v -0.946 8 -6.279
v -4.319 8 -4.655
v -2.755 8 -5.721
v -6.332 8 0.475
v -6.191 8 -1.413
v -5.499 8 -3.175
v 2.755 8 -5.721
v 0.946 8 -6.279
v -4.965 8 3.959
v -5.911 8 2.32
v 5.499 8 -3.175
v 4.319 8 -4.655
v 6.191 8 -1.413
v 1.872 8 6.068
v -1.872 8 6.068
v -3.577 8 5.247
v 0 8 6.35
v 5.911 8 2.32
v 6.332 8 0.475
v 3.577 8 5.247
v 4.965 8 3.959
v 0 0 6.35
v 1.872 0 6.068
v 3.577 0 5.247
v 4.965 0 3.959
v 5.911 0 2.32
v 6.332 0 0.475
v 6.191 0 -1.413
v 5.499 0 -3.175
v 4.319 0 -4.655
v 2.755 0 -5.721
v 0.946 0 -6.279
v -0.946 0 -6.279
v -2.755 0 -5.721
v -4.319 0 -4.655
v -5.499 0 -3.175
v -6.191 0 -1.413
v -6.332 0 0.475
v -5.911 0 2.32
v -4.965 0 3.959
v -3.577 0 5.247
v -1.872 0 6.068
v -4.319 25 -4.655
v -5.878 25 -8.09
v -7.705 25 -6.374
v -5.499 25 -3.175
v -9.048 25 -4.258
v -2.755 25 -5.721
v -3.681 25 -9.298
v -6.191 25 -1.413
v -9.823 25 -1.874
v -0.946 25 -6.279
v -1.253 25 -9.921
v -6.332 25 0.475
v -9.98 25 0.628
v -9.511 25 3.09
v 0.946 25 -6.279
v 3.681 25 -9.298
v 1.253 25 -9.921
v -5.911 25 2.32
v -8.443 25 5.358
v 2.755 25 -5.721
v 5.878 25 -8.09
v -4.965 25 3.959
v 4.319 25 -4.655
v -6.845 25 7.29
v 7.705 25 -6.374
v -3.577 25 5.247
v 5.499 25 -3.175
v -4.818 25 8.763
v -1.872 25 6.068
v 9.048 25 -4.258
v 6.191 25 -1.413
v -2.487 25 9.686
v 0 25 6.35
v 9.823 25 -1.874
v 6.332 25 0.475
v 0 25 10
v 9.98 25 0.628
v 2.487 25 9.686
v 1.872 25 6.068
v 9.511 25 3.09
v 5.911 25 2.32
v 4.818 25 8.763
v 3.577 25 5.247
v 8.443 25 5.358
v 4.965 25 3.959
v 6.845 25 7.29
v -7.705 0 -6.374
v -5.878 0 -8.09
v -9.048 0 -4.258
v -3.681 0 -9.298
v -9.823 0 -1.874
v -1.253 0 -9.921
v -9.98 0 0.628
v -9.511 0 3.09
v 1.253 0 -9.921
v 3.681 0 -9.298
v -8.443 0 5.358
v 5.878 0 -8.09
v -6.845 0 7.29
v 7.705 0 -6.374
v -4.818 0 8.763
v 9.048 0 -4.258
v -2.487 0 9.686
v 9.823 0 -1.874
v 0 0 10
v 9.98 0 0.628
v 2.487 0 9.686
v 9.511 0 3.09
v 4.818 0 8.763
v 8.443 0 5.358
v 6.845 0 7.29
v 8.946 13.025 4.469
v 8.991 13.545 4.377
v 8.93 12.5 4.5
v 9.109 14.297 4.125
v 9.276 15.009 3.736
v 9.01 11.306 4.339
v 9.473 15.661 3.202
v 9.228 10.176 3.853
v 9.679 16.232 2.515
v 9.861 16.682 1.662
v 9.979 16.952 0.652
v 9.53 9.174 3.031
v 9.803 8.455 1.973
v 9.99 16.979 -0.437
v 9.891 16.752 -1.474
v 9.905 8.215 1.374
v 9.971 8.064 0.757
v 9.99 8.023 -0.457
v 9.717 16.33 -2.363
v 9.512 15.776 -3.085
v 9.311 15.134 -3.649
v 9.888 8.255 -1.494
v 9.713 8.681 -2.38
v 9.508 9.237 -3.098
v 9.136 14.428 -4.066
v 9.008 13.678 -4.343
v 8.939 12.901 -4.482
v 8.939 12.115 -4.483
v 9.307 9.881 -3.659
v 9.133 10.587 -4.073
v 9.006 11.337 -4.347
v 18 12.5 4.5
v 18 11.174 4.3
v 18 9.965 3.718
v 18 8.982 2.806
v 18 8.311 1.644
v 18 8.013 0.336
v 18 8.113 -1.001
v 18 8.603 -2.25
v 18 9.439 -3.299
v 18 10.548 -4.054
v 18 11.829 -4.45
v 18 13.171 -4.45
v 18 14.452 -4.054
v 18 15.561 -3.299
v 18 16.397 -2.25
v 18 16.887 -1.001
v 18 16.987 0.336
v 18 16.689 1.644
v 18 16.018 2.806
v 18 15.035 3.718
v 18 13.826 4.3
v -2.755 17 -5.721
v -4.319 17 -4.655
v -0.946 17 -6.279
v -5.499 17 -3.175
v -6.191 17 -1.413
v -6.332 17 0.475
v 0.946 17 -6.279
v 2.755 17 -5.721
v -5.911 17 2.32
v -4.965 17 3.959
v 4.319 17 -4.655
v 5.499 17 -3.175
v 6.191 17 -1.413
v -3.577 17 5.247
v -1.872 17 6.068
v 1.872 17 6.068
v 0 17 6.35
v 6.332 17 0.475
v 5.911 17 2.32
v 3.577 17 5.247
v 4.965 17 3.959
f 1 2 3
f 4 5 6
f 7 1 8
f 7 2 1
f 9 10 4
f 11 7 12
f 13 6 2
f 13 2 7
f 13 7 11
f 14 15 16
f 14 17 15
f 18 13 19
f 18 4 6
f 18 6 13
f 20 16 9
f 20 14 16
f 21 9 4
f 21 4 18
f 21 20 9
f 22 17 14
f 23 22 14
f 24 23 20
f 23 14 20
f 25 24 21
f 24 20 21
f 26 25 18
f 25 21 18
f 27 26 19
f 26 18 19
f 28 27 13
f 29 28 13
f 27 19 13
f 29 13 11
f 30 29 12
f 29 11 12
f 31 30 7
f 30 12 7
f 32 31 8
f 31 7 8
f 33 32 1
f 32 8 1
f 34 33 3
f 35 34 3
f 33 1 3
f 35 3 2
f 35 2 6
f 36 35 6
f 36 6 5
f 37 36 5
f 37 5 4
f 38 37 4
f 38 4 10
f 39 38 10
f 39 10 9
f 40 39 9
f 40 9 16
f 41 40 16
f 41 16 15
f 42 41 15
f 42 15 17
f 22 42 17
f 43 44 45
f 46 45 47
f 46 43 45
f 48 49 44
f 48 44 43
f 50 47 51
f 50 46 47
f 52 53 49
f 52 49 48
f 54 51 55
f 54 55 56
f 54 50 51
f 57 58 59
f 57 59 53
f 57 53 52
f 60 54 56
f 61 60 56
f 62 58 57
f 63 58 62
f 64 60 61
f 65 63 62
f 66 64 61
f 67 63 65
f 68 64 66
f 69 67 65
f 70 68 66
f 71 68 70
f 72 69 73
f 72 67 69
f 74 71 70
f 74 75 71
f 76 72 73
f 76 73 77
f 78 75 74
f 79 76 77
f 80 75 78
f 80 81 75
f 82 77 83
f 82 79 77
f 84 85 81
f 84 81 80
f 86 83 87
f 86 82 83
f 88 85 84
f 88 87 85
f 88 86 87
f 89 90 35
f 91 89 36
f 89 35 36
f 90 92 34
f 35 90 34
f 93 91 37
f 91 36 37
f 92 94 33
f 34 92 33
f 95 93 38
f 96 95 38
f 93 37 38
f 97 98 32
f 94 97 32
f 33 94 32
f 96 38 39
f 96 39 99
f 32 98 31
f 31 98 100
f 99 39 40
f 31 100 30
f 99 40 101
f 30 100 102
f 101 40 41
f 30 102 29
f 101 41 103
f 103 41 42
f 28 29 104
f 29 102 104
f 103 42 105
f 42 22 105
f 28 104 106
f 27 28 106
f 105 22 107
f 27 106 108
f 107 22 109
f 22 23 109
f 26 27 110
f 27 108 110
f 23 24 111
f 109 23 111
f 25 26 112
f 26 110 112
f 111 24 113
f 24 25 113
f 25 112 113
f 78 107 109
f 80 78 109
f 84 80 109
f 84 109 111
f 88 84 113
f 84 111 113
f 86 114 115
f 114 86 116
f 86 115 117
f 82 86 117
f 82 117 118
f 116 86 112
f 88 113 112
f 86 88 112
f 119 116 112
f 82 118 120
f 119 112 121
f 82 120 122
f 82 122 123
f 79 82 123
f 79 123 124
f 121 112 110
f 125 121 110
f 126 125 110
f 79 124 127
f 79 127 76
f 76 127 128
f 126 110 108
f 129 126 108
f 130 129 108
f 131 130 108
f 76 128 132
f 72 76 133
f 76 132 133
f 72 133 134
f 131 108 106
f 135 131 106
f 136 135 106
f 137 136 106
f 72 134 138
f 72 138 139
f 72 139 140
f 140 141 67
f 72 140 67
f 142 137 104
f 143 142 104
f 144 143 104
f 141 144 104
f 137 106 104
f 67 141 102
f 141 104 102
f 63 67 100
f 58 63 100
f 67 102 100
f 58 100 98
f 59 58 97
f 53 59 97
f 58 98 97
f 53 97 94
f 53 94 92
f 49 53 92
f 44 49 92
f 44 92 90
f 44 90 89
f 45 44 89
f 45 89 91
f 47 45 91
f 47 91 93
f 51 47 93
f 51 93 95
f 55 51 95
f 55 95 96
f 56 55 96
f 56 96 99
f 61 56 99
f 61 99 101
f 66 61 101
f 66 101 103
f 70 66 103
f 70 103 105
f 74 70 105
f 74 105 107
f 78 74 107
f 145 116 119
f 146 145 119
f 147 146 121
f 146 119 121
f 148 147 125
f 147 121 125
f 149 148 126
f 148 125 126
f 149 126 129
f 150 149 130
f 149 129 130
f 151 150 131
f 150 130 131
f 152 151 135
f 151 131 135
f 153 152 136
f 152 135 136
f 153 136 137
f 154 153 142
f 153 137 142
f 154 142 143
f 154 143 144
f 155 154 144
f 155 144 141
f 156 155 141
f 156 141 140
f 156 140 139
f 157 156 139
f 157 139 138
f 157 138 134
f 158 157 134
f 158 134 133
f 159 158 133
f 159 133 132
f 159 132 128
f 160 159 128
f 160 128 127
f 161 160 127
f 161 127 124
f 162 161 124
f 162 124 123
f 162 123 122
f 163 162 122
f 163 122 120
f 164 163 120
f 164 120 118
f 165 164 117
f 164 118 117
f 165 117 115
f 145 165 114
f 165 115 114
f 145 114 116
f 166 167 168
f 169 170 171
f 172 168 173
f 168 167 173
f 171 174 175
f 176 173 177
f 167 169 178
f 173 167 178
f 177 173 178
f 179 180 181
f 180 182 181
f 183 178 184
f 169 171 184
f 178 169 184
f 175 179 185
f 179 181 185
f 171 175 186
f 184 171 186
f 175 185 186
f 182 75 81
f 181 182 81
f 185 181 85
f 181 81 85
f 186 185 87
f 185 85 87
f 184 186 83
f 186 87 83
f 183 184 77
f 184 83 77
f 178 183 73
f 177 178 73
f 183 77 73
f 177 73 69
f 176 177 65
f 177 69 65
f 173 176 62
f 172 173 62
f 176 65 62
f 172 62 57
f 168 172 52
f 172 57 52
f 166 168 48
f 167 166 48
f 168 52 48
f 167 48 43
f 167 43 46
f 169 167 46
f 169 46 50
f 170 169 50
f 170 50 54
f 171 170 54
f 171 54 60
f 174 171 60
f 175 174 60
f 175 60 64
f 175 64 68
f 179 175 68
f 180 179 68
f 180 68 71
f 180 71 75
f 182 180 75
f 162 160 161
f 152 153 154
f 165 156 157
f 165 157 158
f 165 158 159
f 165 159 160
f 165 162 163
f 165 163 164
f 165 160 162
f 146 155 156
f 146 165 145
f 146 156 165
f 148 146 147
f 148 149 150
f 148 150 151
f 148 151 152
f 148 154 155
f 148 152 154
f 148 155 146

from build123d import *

# Parameters (mm, degrees)
SKETCH2_R           = 10
BOSS_EXTRUDE1_DEPTH = 25
SKETCH3_R           = 4.5
BOSS_EXTRUDE2_DEPTH = 18
SKETCH7_R           = 6.35
CUT_EXTRUDE2_DEPTH  = 33.388269645
SKETCH8_W           = 15
SKETCH8_H           = 9
BOSS_EXTRUDE3_DEPTH = 6.5


with BuildPart() as part:
    # Sketch2 → Boss-Extrude1 (new body)
    with BuildSketch(Plane(origin=(0, 0, 0), x_dir=(1, 0, 0), z_dir=(0, 1, 0))):
        with Locations(Location((0, 0, 0), (0, 0, 270))):
            Circle(SKETCH2_R)
    extrude(amount=BOSS_EXTRUDE1_DEPTH)

    # Sketch3 → Boss-Extrude2 (add)
    with BuildSketch(Plane(origin=(0, 0, 0), x_dir=(0, 0, -1), z_dir=(1, 0, 0))):
        with Locations(Location((0, 12.5, 0), (0, 0, 180))):
            Circle(SKETCH3_R)
    extrude(amount=BOSS_EXTRUDE2_DEPTH)

    # Sketch7 → Cut-Extrude2 (cut, through all)
    with BuildSketch(Plane(origin=(0, 25, 0), x_dir=(1, 0, 0), z_dir=(0, 1, 0))):
        with Locations(Location((0, 0, 0), (0, 0, 270))):
            Circle(SKETCH7_R)
    extrude(amount=-CUT_EXTRUDE2_DEPTH, mode=Mode.SUBTRACT)

    # Sketch8 → Boss-Extrude3 (add, symmetric)
    with BuildSketch(Plane.XY):
        with Locations((0, 12.5)):
            Rectangle(SKETCH8_W, SKETCH8_H)
    extrude(amount=BOSS_EXTRUDE3_DEPTH, both=True)


solid = part.part
